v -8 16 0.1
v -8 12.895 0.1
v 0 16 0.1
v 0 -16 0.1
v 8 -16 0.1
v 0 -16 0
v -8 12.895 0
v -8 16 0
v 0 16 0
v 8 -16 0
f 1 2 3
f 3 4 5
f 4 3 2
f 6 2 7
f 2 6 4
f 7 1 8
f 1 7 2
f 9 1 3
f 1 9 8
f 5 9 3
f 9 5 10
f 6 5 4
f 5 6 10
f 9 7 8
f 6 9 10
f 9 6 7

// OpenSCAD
use <../lib.scad>
function ldraw_lib__168335i() = [
// 0 Sticker  4.0 x  1.0 Diagonal Stripe Up Left
// 0 Name: 168335i.dat
// 0 Author: Ulrich Röder [UR]
// 0 !LDRAW_ORG Part UPDATE 2018-02
// 0 !LICENSE Licensed under CC BY 4.0 : see CAreadme.txt
// 
// 0 BFC CERTIFY CCW
  [0,"BFC","CERTIFY"],
  [0,"BFC","CCW"],
// 
// 0 !KEYWORDS Set 5591
// 
// 0 !HISTORY 2018-12-08 [PTadmin] Official Update 2018-02
// 
// 
// 3 0 -20 -0.25 40 -20 -0.25 32.237 0 -0.25 40
  [3,0,-20,-0.25,40,-20,-0.25,32.237,0,-0.25,40],
// 4 0 0 -0.25 40 -20 -0.25 32.237 0 -0.25 -40 20 -0.25 -40
  [4,0,0,-0.25,40,-20,-0.25,32.237,0,-0.25,-40,20,-0.25,-40],
// 4 16 0 -0.25 -40 -20 -0.25 32.237 -20 0 32.237 0 0 -40
  [4,16,0,-0.25,-40,-20,-0.25,32.237,-20,0,32.237,0,0,-40],
// 4 16 -20 -0.25 32.237 -20 -0.25 40 -20 0 40 -20 0 32.237
  [4,16,-20,-0.25,32.237,-20,-0.25,40,-20,0,40,-20,0,32.237],
// 4 16 -20 -0.25 40 0 -0.25 40 0 0 40 -20 0 40
  [4,16,-20,-0.25,40,0,-0.25,40,0,0,40,-20,0,40],
// 4 16 0 -0.25 40 20 -0.25 -40 20 0 -40 0 0 40
  [4,16,0,-0.25,40,20,-0.25,-40,20,0,-40,0,0,40],
// 4 16 20 -0.25 -40 0 -0.25 -40 0 0 -40 20 0 -40
  [4,16,20,-0.25,-40,0,-0.25,-40,0,0,-40,20,0,-40],
// 3 16 0 0 40 -20 0 32.237 -20 0 40
  [3,16,0,0,40,-20,0,32.237,-20,0,40],
// 4 16 20 0 -40 0 0 -40 -20 0 32.237 0 0 40
  [4,16,20,0,-40,0,0,-40,-20,0,32.237,0,0,40],
];
module ldraw_lib__168335i(step=0, col=false, unit=2/5, alt=false, line=0.2, solid=!$preview)
    makepoly(ldraw_lib__168335i(), step=step, col=col, unit=unit, alt=alt, line=line, solid=solid);
ldraw_lib__168335i(line=0.2);
